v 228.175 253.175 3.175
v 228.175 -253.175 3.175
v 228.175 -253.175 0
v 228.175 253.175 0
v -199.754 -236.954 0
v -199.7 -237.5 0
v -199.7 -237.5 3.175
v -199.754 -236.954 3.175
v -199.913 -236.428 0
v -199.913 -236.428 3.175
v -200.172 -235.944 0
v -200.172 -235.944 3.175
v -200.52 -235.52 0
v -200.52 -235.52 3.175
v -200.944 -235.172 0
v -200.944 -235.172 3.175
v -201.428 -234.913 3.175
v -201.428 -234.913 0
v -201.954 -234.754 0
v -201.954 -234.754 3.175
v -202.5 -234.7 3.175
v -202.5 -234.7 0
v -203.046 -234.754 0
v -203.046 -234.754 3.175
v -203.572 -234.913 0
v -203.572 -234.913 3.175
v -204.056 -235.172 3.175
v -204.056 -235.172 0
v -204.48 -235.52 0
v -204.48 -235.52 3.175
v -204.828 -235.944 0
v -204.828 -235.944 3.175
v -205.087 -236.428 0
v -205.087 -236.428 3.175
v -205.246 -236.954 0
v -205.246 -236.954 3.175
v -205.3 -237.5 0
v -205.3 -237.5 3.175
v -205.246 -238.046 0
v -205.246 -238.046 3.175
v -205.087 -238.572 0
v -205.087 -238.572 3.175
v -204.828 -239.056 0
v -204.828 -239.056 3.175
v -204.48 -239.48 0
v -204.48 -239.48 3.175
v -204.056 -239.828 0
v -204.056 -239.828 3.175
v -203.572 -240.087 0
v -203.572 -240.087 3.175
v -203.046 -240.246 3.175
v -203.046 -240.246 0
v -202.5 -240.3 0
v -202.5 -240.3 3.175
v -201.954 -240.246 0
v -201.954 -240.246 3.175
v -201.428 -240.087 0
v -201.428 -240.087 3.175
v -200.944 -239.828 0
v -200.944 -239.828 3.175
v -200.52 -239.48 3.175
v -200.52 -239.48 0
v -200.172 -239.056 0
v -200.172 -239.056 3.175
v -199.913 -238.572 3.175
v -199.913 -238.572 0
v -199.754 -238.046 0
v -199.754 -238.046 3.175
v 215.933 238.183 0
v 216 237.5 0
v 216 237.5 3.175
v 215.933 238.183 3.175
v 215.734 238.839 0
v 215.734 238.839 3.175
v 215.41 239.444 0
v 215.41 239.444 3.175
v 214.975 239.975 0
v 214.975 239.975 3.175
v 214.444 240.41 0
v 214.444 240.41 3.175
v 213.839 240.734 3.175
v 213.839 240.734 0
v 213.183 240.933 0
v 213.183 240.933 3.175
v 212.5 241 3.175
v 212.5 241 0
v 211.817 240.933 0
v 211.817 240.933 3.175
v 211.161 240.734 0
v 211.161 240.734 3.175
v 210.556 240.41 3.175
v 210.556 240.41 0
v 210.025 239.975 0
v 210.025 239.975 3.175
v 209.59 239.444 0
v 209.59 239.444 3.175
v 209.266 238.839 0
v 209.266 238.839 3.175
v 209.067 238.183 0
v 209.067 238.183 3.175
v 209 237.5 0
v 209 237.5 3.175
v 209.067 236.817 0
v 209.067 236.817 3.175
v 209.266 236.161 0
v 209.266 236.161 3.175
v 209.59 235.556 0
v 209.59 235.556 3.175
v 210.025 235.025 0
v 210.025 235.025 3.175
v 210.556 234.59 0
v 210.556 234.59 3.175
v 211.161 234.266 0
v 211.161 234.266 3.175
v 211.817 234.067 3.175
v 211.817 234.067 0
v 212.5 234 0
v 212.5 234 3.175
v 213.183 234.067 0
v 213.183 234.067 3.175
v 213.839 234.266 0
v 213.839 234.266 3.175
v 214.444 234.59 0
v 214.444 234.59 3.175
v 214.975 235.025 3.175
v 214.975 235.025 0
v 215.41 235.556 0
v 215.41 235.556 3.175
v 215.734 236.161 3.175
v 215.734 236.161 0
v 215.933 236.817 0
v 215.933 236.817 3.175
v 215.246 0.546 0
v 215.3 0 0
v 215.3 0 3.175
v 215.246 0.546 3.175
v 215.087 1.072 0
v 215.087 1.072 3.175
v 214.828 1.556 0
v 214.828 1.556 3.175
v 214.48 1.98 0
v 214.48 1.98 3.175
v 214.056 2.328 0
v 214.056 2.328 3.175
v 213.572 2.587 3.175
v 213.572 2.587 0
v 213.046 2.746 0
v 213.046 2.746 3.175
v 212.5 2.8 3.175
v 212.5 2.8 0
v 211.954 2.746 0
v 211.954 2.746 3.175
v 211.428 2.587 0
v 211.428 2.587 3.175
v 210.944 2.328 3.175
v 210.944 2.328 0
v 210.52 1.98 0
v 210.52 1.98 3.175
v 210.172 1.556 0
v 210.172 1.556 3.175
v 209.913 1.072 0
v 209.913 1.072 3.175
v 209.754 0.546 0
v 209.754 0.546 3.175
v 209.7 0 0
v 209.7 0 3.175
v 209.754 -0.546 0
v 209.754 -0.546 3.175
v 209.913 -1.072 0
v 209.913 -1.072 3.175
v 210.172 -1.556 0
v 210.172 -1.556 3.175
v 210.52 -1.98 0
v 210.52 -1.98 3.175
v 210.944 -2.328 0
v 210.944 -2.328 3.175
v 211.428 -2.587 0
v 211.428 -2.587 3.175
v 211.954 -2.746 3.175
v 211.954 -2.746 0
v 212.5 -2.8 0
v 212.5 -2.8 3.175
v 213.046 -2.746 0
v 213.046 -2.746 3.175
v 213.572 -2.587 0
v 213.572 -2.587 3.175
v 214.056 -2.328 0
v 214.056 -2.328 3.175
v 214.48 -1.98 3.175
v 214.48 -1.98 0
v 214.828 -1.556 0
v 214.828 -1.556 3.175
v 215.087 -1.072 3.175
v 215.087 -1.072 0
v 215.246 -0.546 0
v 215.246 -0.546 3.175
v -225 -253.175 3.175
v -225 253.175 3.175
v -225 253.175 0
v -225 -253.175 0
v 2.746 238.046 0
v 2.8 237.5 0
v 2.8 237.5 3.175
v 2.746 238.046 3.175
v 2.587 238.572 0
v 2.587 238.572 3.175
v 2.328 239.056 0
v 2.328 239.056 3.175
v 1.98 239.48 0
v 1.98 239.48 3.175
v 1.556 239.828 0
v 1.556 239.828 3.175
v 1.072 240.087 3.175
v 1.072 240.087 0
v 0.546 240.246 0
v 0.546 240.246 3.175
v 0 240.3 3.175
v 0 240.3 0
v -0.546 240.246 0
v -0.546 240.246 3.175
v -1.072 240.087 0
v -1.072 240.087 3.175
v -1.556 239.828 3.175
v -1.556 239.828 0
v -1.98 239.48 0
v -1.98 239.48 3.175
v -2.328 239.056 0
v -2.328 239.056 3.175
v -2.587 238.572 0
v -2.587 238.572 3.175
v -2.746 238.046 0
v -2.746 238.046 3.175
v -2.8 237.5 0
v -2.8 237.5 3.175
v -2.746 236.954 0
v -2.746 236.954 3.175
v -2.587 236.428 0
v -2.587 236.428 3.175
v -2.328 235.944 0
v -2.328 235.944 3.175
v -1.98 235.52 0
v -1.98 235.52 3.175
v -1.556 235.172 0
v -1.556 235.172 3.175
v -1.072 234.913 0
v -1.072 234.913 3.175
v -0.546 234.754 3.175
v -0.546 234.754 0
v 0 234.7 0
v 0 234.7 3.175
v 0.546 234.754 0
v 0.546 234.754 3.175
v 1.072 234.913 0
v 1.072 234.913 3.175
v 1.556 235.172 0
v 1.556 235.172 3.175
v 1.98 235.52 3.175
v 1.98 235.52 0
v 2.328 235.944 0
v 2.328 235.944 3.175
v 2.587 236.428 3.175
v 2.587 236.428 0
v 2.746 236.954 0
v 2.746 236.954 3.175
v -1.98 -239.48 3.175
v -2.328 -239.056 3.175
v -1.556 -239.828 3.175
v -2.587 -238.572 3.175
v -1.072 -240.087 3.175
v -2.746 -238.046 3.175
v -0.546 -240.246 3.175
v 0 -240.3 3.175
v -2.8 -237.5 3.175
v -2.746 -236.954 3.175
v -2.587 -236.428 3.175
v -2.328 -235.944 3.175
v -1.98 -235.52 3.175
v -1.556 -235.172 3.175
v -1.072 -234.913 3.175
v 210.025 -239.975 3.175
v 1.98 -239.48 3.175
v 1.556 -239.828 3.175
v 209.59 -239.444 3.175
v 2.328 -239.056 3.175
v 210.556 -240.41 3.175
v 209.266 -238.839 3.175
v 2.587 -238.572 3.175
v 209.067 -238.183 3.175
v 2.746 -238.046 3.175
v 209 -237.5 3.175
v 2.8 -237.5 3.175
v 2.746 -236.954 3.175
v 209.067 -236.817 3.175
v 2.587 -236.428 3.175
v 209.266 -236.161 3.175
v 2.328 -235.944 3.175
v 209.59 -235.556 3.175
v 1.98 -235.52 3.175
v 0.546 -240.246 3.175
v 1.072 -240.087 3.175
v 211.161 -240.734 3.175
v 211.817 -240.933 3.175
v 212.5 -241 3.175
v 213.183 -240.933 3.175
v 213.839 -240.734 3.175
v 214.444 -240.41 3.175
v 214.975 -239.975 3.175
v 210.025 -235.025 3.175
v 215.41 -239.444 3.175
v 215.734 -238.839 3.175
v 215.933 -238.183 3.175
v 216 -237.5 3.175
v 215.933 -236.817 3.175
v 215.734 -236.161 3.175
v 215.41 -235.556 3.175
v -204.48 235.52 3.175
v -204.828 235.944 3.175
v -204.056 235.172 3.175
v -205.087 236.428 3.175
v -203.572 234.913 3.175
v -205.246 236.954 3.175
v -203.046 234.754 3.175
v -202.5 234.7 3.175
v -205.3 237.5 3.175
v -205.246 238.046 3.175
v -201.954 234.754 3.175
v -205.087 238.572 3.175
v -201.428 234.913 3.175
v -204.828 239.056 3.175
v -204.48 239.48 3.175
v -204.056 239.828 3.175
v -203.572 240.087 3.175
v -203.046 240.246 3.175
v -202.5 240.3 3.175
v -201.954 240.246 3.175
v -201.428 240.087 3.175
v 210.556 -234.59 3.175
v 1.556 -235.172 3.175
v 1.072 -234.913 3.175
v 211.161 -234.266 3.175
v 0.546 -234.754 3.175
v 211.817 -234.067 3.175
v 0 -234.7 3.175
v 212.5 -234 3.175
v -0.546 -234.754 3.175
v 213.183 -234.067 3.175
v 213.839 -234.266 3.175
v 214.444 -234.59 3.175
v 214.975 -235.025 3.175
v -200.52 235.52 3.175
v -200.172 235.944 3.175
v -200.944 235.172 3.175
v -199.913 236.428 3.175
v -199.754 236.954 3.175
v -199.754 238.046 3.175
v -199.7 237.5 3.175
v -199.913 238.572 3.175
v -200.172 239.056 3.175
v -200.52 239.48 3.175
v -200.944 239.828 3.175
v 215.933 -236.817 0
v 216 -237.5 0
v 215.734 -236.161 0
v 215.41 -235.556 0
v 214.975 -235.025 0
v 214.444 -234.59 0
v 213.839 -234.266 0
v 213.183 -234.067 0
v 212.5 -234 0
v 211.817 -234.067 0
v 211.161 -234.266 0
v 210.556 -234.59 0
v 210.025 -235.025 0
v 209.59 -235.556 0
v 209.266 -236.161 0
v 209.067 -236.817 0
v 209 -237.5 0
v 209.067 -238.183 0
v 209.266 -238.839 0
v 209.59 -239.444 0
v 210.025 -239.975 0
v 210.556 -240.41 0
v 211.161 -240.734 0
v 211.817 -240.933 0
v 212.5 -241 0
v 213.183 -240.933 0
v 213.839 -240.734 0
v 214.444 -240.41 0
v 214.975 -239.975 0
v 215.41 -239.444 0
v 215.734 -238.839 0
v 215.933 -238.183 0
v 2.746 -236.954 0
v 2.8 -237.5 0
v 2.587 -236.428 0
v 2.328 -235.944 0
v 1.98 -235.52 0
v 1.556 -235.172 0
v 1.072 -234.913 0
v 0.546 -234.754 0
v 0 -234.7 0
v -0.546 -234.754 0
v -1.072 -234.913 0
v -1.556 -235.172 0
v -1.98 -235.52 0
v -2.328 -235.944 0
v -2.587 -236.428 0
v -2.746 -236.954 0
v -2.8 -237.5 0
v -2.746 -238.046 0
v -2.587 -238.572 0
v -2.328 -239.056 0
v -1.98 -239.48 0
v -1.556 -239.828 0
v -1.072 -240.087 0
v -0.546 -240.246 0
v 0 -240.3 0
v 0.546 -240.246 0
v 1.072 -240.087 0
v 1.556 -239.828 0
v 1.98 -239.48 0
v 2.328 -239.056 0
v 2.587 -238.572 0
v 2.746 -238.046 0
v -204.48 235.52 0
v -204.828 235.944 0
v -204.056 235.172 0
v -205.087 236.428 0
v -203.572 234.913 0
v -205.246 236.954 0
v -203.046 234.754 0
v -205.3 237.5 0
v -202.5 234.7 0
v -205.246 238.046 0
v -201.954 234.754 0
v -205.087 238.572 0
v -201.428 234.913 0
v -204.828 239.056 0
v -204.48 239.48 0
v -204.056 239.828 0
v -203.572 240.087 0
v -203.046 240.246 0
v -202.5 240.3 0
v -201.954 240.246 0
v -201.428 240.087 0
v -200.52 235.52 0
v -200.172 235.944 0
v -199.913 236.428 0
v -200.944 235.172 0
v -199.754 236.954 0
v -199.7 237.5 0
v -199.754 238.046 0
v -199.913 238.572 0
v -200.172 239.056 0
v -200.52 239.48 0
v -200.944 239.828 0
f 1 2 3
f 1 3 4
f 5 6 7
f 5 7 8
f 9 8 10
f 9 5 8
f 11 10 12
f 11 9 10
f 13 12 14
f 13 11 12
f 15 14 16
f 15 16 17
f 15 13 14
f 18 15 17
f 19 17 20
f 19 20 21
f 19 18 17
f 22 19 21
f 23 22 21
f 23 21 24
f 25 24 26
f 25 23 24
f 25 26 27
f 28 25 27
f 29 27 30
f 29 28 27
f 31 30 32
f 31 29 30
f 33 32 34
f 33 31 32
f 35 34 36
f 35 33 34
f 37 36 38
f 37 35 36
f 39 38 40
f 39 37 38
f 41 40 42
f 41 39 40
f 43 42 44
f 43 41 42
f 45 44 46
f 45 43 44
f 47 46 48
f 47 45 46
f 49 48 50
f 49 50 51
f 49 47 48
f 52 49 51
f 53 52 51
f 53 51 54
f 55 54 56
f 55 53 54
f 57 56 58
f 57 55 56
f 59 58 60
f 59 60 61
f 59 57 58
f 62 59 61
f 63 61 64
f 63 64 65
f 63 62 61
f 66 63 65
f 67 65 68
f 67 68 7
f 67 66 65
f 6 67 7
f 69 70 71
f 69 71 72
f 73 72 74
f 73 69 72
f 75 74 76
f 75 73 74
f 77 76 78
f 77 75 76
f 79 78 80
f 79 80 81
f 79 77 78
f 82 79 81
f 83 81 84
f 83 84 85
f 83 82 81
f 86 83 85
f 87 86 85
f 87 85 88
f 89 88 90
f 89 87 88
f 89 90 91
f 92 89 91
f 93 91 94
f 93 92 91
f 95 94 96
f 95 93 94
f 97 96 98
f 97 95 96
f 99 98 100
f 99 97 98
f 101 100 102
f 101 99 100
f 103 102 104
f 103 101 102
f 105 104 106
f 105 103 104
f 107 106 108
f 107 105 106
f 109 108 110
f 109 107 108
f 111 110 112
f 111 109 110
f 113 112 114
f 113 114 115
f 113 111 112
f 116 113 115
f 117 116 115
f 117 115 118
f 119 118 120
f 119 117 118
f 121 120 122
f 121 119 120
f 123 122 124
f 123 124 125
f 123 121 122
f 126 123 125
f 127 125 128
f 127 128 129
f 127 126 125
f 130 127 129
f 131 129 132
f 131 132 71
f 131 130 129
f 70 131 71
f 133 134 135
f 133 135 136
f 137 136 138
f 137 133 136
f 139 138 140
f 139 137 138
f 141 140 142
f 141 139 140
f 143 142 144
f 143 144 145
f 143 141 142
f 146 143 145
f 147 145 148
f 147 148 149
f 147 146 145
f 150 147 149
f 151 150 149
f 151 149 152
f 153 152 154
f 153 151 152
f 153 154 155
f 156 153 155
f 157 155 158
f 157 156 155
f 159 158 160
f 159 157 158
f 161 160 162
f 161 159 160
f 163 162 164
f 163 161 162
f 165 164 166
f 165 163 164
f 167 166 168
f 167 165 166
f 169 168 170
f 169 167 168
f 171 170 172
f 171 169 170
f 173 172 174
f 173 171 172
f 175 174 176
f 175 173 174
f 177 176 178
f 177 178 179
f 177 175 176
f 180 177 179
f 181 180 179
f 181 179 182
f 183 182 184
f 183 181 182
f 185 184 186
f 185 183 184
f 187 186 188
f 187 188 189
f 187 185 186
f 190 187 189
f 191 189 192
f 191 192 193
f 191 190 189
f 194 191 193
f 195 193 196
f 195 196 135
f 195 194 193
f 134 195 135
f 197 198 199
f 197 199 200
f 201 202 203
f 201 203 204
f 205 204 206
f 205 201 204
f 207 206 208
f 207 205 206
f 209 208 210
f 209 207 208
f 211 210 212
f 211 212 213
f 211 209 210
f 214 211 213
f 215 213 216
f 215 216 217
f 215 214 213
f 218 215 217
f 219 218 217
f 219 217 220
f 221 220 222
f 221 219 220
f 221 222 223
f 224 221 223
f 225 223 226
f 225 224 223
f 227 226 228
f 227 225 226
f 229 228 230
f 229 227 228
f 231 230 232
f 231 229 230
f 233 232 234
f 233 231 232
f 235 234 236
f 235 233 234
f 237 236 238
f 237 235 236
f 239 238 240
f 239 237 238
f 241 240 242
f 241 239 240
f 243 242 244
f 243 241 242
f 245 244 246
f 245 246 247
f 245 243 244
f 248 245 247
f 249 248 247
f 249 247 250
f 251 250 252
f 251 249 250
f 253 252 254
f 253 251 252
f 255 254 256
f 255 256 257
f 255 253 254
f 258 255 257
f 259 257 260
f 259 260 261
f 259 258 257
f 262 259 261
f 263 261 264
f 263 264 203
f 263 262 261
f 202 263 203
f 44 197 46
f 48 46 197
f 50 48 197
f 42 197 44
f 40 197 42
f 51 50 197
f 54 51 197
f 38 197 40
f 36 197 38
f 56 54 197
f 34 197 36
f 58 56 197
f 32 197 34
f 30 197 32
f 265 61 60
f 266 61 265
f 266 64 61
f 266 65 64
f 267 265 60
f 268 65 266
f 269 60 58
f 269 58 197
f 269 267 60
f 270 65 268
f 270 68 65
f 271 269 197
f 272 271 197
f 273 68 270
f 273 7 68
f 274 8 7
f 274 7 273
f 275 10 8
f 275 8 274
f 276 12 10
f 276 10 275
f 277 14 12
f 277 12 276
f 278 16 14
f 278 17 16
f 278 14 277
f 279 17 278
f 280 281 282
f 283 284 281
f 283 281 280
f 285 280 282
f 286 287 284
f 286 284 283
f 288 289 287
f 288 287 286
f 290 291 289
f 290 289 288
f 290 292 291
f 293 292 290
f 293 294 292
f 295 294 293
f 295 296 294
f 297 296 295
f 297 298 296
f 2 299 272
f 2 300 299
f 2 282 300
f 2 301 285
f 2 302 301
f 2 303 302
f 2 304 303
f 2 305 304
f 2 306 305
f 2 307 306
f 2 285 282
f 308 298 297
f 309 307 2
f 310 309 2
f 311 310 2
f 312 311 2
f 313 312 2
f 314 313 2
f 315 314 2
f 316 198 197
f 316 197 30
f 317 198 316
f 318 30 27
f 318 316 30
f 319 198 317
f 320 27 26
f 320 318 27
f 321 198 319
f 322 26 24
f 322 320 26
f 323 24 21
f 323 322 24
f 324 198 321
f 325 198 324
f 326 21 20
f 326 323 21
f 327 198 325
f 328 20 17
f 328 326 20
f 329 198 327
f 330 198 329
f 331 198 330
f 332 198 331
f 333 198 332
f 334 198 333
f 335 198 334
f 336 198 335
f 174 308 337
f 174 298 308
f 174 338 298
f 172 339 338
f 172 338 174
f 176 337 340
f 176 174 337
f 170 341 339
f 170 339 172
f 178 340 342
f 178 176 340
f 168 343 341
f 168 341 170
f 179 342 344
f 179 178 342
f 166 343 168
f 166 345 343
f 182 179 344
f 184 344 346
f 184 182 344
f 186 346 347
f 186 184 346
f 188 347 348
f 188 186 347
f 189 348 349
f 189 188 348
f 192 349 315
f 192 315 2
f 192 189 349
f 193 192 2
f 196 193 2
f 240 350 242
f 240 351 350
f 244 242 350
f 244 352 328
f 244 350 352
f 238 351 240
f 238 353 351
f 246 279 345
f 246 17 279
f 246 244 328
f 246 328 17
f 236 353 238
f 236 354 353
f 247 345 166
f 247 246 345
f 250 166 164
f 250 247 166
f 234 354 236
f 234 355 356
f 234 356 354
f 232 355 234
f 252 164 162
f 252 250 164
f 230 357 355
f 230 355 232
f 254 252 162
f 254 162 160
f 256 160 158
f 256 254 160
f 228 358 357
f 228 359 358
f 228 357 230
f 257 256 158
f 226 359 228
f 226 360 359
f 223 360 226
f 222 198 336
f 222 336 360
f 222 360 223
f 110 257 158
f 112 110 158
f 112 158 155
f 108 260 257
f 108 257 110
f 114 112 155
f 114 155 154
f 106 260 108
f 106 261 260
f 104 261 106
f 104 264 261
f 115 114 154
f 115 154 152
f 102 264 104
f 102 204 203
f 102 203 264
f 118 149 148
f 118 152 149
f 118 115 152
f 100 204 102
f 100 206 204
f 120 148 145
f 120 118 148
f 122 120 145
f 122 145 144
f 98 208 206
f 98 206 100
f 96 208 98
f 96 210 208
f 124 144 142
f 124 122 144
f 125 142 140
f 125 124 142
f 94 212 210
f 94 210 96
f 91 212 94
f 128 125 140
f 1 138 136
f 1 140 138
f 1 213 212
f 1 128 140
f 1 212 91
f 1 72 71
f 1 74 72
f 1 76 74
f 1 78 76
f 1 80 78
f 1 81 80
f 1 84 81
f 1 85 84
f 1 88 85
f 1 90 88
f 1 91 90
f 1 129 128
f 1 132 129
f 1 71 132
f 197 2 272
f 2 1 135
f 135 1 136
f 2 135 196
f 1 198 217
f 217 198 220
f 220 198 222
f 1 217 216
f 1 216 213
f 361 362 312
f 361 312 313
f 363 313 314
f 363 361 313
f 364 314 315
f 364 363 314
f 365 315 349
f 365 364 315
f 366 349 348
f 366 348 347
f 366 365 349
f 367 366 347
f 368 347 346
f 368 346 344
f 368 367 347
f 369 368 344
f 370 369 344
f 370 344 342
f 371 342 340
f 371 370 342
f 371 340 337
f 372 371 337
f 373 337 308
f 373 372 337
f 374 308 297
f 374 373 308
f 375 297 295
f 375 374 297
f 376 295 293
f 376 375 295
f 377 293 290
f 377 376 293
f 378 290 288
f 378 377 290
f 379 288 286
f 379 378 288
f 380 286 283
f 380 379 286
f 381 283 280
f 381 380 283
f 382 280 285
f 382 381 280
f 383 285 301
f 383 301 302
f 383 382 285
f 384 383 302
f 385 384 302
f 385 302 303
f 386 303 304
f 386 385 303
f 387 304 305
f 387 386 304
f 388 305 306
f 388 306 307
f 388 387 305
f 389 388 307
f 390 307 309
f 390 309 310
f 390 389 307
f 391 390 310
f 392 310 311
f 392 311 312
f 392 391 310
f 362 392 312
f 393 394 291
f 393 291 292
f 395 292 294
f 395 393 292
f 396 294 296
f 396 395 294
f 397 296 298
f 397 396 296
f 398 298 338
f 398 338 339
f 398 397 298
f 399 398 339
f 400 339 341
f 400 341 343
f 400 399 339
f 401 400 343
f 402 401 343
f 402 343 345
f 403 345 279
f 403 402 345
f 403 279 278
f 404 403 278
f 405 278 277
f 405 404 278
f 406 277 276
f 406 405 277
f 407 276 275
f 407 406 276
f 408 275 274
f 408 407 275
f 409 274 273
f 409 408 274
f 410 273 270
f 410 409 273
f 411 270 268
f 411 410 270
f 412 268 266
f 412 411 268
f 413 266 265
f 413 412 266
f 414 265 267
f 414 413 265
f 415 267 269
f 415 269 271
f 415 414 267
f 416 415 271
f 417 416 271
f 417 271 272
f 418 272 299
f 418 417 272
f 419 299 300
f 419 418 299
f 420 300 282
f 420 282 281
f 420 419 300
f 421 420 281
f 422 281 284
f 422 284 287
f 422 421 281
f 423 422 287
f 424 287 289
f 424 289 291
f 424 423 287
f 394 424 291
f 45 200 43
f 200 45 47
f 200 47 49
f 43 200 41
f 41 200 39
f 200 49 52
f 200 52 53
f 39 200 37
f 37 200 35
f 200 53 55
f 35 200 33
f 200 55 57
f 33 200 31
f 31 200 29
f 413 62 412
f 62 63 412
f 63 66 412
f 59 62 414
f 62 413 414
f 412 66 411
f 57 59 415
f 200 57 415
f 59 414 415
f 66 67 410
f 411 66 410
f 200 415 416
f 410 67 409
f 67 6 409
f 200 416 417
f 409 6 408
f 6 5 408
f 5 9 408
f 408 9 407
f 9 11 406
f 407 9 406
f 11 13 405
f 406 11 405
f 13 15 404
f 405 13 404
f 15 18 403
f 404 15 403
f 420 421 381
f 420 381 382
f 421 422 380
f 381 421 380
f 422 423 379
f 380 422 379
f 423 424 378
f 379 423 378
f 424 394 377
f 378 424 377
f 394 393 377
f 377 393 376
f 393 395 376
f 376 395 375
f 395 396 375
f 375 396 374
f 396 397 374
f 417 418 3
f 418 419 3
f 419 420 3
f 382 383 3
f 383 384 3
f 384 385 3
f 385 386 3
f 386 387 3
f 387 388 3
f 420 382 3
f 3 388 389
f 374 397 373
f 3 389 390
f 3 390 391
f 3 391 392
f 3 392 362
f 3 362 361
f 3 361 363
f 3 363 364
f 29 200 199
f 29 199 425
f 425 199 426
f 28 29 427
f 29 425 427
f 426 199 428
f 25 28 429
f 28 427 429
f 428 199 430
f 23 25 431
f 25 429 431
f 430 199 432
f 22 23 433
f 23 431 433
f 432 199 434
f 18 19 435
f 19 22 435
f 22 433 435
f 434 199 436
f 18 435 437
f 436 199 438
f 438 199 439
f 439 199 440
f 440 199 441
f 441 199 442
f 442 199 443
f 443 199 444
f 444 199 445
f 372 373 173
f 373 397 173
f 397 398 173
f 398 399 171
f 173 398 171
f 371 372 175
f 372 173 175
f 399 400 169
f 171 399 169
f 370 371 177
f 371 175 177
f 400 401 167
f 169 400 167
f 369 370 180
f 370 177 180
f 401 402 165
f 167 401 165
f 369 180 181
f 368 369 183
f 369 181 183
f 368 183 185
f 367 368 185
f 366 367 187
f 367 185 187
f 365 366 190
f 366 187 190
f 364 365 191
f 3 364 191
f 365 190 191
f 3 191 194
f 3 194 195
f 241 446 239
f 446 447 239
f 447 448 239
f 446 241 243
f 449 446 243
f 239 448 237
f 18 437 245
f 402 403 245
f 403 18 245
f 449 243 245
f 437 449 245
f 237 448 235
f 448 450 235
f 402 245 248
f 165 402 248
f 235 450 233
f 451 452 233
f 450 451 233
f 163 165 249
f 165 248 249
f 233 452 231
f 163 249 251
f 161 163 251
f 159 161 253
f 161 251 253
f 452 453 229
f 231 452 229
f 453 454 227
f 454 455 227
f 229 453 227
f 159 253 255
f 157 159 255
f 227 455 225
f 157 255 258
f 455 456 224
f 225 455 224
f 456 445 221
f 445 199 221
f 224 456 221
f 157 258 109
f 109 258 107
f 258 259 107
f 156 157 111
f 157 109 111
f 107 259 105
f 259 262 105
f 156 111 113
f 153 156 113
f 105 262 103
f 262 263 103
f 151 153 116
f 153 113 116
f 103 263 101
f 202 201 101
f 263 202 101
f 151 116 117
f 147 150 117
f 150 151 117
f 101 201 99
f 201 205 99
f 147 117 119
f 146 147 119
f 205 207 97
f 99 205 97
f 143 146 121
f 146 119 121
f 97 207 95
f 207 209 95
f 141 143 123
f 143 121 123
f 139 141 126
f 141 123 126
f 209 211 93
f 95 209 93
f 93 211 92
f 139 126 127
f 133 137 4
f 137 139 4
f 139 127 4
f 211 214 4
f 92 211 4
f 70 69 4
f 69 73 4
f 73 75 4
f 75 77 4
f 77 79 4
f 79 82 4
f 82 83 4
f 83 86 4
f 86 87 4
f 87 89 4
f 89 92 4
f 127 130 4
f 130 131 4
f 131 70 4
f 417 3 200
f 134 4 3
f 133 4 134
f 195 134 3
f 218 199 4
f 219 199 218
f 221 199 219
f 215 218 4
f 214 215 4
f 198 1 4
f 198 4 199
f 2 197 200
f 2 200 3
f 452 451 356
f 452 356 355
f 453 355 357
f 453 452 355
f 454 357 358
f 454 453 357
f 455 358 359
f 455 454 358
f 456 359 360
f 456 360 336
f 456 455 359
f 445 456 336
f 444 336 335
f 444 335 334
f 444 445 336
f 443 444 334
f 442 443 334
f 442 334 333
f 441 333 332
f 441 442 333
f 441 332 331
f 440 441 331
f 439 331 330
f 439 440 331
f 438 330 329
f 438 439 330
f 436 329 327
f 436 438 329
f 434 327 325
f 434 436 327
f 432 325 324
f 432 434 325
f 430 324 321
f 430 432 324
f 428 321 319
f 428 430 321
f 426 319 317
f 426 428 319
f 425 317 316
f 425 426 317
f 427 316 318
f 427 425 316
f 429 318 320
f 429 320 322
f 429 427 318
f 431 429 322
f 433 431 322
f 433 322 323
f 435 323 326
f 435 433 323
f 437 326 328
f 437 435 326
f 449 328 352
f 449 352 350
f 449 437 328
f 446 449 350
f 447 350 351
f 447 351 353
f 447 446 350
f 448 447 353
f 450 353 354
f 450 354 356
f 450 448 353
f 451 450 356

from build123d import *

# Parameters (mm, degrees)
SKETCH1_W           = 500
SKETCH1_H           = 450
SKETCH1_R           = 3.5
SKETCH1_R_2         = 2.8
BOSS_EXTRUDE1_DEPTH = 3.175
SKETCH2_W           = 3.175
SKETCH2_H           = 500
BOSS_EXTRUDE2_DEPTH = 3.175


with BuildPart() as part:
    # Sketch1 → Boss-Extrude1 (new body)
    with BuildSketch(Plane(origin=(0, 0, 0), x_dir=(0, 1, 0), z_dir=(0, 0, 1))):
        Rectangle(SKETCH1_W, SKETCH1_H)
        with Locations(Location((237.5, -212.5, 0), (0, 0, 270))):
            Circle(SKETCH1_R, mode=Mode.SUBTRACT)
        with Locations(Location((-237.5, -212.5, 0), (0, 0, 270))):
            Circle(SKETCH1_R, mode=Mode.SUBTRACT)
        with Locations(Location((-237.5, 202.5, 0), (0, 0, 270))):
            Circle(SKETCH1_R_2, mode=Mode.SUBTRACT)
        with Locations(Location((237.5, 202.5, 0), (0, 0, 270))):
            Circle(SKETCH1_R_2, mode=Mode.SUBTRACT)
        with Locations(Location((-237.5, 0, 0), (0, 0, 270))):
            Circle(SKETCH1_R_2, mode=Mode.SUBTRACT)
        with Locations(Location((237.5, 0, 0), (0, 0, 270))):
            Circle(SKETCH1_R_2, mode=Mode.SUBTRACT)
        with Locations(Location((0, -212.5, 0), (0, 0, 270))):
            Circle(SKETCH1_R_2, mode=Mode.SUBTRACT)
    extrude(amount=BOSS_EXTRUDE1_DEPTH)

    # Sketch2 → Boss-Extrude2 (add, through all)
    with BuildSketch(Plane.XY.offset(3.175)):
        Polygon((225, -250), (-225, -250), (-225, -253.175), (228.175, -253.175), (228.175, -250), align=None)
        with Locations((226.5875, 0)):
            Rectangle(SKETCH2_W, SKETCH2_H)
        Polygon((-225, 250), (225, 250), (228.175, 250), (228.175, 253.175), (-225, 253.175), align=None)
    extrude(amount=-BOSS_EXTRUDE2_DEPTH)


solid = part.part
